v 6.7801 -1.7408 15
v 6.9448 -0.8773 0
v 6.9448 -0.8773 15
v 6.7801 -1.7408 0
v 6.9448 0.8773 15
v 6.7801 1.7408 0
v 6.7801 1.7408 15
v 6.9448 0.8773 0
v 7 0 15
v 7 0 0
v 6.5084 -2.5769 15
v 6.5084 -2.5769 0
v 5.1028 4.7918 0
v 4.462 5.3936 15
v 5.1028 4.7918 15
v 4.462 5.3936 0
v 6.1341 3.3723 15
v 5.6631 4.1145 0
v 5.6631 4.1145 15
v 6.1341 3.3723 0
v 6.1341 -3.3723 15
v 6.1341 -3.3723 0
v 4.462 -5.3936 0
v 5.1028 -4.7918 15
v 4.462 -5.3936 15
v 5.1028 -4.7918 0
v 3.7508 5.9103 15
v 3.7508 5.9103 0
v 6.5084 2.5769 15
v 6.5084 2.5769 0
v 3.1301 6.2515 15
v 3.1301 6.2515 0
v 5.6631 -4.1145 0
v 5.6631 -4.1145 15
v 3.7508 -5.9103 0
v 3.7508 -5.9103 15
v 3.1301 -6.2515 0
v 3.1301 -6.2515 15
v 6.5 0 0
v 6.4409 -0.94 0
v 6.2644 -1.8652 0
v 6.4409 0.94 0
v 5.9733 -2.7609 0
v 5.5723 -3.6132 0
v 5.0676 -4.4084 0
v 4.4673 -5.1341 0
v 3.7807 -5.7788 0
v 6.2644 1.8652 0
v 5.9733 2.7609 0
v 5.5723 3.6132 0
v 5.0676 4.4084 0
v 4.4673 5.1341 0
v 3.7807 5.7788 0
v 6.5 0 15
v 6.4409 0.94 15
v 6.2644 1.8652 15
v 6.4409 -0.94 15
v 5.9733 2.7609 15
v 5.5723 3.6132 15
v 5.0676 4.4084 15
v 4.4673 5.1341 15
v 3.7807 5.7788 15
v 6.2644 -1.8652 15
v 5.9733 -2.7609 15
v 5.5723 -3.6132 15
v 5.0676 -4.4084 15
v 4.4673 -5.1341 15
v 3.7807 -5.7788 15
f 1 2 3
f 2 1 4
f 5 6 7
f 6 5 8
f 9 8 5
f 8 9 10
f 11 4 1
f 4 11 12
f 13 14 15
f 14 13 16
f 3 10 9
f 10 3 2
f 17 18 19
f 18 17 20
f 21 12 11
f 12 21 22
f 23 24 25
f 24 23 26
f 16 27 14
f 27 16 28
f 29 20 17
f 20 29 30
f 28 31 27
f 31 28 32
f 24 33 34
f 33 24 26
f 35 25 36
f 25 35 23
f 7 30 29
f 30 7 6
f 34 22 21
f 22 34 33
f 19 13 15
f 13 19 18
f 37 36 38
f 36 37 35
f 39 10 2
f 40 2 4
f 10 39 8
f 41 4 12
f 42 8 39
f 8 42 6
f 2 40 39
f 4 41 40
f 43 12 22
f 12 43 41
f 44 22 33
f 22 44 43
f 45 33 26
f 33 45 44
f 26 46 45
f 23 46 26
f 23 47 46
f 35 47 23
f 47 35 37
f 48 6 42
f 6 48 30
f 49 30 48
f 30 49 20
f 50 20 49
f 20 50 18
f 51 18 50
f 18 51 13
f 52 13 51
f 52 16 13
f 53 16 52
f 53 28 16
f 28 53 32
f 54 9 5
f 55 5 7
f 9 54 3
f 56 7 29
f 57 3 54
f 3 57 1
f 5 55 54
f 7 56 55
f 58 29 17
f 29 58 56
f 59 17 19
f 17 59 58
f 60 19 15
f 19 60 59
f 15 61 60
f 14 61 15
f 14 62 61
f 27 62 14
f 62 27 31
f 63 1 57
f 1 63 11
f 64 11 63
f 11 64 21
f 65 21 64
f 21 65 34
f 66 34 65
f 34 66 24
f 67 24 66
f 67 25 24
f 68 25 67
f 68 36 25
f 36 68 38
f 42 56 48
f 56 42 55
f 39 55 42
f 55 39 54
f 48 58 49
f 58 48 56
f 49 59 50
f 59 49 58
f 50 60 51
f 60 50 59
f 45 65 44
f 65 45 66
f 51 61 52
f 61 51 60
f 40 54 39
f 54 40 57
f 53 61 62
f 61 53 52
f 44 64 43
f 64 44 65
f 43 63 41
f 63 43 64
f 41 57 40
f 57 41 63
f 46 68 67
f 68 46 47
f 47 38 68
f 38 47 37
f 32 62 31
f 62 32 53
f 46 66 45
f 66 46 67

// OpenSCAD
$fn = 50;


difference() {
	union() {
		cylinder(h = 15, r = 7.0000000000);
		translate(v = [-4.0000000000, 0, 0]) {
			cylinder(h = 15, r = 7.0000000000);
		}
	}
	union() {
		cylinder(h = 15, r = 3.2500000000);
		cylinder(h = 15, r = 1.8000000000);
		cylinder(h = 15, r = 1.8000000000);
		cylinder(h = 15, r = 1.8000000000);
		translate(v = [-8.5000000000, 0, 0]) {
			hull() {
				translate(v = [-3.7500000000, 0.0000000000, 0]) {
					cylinder(h = 15, r = 7.5000000000);
				}
				translate(v = [3.7500000000, 0.0000000000, 0]) {
					cylinder(h = 15, r = 7.5000000000);
				}
				translate(v = [-3.7500000000, -0.0000000000, 0]) {
					cylinder(h = 15, r = 7.5000000000);
				}
				translate(v = [3.7500000000, -0.0000000000, 0]) {
					cylinder(h = 15, r = 7.5000000000);
				}
			}
		}
		translate(v = [-1.0000000000, 0, 0.0000000000]) {
			cylinder(h = 15, r = 7.5000000000);
		}
	}
}
